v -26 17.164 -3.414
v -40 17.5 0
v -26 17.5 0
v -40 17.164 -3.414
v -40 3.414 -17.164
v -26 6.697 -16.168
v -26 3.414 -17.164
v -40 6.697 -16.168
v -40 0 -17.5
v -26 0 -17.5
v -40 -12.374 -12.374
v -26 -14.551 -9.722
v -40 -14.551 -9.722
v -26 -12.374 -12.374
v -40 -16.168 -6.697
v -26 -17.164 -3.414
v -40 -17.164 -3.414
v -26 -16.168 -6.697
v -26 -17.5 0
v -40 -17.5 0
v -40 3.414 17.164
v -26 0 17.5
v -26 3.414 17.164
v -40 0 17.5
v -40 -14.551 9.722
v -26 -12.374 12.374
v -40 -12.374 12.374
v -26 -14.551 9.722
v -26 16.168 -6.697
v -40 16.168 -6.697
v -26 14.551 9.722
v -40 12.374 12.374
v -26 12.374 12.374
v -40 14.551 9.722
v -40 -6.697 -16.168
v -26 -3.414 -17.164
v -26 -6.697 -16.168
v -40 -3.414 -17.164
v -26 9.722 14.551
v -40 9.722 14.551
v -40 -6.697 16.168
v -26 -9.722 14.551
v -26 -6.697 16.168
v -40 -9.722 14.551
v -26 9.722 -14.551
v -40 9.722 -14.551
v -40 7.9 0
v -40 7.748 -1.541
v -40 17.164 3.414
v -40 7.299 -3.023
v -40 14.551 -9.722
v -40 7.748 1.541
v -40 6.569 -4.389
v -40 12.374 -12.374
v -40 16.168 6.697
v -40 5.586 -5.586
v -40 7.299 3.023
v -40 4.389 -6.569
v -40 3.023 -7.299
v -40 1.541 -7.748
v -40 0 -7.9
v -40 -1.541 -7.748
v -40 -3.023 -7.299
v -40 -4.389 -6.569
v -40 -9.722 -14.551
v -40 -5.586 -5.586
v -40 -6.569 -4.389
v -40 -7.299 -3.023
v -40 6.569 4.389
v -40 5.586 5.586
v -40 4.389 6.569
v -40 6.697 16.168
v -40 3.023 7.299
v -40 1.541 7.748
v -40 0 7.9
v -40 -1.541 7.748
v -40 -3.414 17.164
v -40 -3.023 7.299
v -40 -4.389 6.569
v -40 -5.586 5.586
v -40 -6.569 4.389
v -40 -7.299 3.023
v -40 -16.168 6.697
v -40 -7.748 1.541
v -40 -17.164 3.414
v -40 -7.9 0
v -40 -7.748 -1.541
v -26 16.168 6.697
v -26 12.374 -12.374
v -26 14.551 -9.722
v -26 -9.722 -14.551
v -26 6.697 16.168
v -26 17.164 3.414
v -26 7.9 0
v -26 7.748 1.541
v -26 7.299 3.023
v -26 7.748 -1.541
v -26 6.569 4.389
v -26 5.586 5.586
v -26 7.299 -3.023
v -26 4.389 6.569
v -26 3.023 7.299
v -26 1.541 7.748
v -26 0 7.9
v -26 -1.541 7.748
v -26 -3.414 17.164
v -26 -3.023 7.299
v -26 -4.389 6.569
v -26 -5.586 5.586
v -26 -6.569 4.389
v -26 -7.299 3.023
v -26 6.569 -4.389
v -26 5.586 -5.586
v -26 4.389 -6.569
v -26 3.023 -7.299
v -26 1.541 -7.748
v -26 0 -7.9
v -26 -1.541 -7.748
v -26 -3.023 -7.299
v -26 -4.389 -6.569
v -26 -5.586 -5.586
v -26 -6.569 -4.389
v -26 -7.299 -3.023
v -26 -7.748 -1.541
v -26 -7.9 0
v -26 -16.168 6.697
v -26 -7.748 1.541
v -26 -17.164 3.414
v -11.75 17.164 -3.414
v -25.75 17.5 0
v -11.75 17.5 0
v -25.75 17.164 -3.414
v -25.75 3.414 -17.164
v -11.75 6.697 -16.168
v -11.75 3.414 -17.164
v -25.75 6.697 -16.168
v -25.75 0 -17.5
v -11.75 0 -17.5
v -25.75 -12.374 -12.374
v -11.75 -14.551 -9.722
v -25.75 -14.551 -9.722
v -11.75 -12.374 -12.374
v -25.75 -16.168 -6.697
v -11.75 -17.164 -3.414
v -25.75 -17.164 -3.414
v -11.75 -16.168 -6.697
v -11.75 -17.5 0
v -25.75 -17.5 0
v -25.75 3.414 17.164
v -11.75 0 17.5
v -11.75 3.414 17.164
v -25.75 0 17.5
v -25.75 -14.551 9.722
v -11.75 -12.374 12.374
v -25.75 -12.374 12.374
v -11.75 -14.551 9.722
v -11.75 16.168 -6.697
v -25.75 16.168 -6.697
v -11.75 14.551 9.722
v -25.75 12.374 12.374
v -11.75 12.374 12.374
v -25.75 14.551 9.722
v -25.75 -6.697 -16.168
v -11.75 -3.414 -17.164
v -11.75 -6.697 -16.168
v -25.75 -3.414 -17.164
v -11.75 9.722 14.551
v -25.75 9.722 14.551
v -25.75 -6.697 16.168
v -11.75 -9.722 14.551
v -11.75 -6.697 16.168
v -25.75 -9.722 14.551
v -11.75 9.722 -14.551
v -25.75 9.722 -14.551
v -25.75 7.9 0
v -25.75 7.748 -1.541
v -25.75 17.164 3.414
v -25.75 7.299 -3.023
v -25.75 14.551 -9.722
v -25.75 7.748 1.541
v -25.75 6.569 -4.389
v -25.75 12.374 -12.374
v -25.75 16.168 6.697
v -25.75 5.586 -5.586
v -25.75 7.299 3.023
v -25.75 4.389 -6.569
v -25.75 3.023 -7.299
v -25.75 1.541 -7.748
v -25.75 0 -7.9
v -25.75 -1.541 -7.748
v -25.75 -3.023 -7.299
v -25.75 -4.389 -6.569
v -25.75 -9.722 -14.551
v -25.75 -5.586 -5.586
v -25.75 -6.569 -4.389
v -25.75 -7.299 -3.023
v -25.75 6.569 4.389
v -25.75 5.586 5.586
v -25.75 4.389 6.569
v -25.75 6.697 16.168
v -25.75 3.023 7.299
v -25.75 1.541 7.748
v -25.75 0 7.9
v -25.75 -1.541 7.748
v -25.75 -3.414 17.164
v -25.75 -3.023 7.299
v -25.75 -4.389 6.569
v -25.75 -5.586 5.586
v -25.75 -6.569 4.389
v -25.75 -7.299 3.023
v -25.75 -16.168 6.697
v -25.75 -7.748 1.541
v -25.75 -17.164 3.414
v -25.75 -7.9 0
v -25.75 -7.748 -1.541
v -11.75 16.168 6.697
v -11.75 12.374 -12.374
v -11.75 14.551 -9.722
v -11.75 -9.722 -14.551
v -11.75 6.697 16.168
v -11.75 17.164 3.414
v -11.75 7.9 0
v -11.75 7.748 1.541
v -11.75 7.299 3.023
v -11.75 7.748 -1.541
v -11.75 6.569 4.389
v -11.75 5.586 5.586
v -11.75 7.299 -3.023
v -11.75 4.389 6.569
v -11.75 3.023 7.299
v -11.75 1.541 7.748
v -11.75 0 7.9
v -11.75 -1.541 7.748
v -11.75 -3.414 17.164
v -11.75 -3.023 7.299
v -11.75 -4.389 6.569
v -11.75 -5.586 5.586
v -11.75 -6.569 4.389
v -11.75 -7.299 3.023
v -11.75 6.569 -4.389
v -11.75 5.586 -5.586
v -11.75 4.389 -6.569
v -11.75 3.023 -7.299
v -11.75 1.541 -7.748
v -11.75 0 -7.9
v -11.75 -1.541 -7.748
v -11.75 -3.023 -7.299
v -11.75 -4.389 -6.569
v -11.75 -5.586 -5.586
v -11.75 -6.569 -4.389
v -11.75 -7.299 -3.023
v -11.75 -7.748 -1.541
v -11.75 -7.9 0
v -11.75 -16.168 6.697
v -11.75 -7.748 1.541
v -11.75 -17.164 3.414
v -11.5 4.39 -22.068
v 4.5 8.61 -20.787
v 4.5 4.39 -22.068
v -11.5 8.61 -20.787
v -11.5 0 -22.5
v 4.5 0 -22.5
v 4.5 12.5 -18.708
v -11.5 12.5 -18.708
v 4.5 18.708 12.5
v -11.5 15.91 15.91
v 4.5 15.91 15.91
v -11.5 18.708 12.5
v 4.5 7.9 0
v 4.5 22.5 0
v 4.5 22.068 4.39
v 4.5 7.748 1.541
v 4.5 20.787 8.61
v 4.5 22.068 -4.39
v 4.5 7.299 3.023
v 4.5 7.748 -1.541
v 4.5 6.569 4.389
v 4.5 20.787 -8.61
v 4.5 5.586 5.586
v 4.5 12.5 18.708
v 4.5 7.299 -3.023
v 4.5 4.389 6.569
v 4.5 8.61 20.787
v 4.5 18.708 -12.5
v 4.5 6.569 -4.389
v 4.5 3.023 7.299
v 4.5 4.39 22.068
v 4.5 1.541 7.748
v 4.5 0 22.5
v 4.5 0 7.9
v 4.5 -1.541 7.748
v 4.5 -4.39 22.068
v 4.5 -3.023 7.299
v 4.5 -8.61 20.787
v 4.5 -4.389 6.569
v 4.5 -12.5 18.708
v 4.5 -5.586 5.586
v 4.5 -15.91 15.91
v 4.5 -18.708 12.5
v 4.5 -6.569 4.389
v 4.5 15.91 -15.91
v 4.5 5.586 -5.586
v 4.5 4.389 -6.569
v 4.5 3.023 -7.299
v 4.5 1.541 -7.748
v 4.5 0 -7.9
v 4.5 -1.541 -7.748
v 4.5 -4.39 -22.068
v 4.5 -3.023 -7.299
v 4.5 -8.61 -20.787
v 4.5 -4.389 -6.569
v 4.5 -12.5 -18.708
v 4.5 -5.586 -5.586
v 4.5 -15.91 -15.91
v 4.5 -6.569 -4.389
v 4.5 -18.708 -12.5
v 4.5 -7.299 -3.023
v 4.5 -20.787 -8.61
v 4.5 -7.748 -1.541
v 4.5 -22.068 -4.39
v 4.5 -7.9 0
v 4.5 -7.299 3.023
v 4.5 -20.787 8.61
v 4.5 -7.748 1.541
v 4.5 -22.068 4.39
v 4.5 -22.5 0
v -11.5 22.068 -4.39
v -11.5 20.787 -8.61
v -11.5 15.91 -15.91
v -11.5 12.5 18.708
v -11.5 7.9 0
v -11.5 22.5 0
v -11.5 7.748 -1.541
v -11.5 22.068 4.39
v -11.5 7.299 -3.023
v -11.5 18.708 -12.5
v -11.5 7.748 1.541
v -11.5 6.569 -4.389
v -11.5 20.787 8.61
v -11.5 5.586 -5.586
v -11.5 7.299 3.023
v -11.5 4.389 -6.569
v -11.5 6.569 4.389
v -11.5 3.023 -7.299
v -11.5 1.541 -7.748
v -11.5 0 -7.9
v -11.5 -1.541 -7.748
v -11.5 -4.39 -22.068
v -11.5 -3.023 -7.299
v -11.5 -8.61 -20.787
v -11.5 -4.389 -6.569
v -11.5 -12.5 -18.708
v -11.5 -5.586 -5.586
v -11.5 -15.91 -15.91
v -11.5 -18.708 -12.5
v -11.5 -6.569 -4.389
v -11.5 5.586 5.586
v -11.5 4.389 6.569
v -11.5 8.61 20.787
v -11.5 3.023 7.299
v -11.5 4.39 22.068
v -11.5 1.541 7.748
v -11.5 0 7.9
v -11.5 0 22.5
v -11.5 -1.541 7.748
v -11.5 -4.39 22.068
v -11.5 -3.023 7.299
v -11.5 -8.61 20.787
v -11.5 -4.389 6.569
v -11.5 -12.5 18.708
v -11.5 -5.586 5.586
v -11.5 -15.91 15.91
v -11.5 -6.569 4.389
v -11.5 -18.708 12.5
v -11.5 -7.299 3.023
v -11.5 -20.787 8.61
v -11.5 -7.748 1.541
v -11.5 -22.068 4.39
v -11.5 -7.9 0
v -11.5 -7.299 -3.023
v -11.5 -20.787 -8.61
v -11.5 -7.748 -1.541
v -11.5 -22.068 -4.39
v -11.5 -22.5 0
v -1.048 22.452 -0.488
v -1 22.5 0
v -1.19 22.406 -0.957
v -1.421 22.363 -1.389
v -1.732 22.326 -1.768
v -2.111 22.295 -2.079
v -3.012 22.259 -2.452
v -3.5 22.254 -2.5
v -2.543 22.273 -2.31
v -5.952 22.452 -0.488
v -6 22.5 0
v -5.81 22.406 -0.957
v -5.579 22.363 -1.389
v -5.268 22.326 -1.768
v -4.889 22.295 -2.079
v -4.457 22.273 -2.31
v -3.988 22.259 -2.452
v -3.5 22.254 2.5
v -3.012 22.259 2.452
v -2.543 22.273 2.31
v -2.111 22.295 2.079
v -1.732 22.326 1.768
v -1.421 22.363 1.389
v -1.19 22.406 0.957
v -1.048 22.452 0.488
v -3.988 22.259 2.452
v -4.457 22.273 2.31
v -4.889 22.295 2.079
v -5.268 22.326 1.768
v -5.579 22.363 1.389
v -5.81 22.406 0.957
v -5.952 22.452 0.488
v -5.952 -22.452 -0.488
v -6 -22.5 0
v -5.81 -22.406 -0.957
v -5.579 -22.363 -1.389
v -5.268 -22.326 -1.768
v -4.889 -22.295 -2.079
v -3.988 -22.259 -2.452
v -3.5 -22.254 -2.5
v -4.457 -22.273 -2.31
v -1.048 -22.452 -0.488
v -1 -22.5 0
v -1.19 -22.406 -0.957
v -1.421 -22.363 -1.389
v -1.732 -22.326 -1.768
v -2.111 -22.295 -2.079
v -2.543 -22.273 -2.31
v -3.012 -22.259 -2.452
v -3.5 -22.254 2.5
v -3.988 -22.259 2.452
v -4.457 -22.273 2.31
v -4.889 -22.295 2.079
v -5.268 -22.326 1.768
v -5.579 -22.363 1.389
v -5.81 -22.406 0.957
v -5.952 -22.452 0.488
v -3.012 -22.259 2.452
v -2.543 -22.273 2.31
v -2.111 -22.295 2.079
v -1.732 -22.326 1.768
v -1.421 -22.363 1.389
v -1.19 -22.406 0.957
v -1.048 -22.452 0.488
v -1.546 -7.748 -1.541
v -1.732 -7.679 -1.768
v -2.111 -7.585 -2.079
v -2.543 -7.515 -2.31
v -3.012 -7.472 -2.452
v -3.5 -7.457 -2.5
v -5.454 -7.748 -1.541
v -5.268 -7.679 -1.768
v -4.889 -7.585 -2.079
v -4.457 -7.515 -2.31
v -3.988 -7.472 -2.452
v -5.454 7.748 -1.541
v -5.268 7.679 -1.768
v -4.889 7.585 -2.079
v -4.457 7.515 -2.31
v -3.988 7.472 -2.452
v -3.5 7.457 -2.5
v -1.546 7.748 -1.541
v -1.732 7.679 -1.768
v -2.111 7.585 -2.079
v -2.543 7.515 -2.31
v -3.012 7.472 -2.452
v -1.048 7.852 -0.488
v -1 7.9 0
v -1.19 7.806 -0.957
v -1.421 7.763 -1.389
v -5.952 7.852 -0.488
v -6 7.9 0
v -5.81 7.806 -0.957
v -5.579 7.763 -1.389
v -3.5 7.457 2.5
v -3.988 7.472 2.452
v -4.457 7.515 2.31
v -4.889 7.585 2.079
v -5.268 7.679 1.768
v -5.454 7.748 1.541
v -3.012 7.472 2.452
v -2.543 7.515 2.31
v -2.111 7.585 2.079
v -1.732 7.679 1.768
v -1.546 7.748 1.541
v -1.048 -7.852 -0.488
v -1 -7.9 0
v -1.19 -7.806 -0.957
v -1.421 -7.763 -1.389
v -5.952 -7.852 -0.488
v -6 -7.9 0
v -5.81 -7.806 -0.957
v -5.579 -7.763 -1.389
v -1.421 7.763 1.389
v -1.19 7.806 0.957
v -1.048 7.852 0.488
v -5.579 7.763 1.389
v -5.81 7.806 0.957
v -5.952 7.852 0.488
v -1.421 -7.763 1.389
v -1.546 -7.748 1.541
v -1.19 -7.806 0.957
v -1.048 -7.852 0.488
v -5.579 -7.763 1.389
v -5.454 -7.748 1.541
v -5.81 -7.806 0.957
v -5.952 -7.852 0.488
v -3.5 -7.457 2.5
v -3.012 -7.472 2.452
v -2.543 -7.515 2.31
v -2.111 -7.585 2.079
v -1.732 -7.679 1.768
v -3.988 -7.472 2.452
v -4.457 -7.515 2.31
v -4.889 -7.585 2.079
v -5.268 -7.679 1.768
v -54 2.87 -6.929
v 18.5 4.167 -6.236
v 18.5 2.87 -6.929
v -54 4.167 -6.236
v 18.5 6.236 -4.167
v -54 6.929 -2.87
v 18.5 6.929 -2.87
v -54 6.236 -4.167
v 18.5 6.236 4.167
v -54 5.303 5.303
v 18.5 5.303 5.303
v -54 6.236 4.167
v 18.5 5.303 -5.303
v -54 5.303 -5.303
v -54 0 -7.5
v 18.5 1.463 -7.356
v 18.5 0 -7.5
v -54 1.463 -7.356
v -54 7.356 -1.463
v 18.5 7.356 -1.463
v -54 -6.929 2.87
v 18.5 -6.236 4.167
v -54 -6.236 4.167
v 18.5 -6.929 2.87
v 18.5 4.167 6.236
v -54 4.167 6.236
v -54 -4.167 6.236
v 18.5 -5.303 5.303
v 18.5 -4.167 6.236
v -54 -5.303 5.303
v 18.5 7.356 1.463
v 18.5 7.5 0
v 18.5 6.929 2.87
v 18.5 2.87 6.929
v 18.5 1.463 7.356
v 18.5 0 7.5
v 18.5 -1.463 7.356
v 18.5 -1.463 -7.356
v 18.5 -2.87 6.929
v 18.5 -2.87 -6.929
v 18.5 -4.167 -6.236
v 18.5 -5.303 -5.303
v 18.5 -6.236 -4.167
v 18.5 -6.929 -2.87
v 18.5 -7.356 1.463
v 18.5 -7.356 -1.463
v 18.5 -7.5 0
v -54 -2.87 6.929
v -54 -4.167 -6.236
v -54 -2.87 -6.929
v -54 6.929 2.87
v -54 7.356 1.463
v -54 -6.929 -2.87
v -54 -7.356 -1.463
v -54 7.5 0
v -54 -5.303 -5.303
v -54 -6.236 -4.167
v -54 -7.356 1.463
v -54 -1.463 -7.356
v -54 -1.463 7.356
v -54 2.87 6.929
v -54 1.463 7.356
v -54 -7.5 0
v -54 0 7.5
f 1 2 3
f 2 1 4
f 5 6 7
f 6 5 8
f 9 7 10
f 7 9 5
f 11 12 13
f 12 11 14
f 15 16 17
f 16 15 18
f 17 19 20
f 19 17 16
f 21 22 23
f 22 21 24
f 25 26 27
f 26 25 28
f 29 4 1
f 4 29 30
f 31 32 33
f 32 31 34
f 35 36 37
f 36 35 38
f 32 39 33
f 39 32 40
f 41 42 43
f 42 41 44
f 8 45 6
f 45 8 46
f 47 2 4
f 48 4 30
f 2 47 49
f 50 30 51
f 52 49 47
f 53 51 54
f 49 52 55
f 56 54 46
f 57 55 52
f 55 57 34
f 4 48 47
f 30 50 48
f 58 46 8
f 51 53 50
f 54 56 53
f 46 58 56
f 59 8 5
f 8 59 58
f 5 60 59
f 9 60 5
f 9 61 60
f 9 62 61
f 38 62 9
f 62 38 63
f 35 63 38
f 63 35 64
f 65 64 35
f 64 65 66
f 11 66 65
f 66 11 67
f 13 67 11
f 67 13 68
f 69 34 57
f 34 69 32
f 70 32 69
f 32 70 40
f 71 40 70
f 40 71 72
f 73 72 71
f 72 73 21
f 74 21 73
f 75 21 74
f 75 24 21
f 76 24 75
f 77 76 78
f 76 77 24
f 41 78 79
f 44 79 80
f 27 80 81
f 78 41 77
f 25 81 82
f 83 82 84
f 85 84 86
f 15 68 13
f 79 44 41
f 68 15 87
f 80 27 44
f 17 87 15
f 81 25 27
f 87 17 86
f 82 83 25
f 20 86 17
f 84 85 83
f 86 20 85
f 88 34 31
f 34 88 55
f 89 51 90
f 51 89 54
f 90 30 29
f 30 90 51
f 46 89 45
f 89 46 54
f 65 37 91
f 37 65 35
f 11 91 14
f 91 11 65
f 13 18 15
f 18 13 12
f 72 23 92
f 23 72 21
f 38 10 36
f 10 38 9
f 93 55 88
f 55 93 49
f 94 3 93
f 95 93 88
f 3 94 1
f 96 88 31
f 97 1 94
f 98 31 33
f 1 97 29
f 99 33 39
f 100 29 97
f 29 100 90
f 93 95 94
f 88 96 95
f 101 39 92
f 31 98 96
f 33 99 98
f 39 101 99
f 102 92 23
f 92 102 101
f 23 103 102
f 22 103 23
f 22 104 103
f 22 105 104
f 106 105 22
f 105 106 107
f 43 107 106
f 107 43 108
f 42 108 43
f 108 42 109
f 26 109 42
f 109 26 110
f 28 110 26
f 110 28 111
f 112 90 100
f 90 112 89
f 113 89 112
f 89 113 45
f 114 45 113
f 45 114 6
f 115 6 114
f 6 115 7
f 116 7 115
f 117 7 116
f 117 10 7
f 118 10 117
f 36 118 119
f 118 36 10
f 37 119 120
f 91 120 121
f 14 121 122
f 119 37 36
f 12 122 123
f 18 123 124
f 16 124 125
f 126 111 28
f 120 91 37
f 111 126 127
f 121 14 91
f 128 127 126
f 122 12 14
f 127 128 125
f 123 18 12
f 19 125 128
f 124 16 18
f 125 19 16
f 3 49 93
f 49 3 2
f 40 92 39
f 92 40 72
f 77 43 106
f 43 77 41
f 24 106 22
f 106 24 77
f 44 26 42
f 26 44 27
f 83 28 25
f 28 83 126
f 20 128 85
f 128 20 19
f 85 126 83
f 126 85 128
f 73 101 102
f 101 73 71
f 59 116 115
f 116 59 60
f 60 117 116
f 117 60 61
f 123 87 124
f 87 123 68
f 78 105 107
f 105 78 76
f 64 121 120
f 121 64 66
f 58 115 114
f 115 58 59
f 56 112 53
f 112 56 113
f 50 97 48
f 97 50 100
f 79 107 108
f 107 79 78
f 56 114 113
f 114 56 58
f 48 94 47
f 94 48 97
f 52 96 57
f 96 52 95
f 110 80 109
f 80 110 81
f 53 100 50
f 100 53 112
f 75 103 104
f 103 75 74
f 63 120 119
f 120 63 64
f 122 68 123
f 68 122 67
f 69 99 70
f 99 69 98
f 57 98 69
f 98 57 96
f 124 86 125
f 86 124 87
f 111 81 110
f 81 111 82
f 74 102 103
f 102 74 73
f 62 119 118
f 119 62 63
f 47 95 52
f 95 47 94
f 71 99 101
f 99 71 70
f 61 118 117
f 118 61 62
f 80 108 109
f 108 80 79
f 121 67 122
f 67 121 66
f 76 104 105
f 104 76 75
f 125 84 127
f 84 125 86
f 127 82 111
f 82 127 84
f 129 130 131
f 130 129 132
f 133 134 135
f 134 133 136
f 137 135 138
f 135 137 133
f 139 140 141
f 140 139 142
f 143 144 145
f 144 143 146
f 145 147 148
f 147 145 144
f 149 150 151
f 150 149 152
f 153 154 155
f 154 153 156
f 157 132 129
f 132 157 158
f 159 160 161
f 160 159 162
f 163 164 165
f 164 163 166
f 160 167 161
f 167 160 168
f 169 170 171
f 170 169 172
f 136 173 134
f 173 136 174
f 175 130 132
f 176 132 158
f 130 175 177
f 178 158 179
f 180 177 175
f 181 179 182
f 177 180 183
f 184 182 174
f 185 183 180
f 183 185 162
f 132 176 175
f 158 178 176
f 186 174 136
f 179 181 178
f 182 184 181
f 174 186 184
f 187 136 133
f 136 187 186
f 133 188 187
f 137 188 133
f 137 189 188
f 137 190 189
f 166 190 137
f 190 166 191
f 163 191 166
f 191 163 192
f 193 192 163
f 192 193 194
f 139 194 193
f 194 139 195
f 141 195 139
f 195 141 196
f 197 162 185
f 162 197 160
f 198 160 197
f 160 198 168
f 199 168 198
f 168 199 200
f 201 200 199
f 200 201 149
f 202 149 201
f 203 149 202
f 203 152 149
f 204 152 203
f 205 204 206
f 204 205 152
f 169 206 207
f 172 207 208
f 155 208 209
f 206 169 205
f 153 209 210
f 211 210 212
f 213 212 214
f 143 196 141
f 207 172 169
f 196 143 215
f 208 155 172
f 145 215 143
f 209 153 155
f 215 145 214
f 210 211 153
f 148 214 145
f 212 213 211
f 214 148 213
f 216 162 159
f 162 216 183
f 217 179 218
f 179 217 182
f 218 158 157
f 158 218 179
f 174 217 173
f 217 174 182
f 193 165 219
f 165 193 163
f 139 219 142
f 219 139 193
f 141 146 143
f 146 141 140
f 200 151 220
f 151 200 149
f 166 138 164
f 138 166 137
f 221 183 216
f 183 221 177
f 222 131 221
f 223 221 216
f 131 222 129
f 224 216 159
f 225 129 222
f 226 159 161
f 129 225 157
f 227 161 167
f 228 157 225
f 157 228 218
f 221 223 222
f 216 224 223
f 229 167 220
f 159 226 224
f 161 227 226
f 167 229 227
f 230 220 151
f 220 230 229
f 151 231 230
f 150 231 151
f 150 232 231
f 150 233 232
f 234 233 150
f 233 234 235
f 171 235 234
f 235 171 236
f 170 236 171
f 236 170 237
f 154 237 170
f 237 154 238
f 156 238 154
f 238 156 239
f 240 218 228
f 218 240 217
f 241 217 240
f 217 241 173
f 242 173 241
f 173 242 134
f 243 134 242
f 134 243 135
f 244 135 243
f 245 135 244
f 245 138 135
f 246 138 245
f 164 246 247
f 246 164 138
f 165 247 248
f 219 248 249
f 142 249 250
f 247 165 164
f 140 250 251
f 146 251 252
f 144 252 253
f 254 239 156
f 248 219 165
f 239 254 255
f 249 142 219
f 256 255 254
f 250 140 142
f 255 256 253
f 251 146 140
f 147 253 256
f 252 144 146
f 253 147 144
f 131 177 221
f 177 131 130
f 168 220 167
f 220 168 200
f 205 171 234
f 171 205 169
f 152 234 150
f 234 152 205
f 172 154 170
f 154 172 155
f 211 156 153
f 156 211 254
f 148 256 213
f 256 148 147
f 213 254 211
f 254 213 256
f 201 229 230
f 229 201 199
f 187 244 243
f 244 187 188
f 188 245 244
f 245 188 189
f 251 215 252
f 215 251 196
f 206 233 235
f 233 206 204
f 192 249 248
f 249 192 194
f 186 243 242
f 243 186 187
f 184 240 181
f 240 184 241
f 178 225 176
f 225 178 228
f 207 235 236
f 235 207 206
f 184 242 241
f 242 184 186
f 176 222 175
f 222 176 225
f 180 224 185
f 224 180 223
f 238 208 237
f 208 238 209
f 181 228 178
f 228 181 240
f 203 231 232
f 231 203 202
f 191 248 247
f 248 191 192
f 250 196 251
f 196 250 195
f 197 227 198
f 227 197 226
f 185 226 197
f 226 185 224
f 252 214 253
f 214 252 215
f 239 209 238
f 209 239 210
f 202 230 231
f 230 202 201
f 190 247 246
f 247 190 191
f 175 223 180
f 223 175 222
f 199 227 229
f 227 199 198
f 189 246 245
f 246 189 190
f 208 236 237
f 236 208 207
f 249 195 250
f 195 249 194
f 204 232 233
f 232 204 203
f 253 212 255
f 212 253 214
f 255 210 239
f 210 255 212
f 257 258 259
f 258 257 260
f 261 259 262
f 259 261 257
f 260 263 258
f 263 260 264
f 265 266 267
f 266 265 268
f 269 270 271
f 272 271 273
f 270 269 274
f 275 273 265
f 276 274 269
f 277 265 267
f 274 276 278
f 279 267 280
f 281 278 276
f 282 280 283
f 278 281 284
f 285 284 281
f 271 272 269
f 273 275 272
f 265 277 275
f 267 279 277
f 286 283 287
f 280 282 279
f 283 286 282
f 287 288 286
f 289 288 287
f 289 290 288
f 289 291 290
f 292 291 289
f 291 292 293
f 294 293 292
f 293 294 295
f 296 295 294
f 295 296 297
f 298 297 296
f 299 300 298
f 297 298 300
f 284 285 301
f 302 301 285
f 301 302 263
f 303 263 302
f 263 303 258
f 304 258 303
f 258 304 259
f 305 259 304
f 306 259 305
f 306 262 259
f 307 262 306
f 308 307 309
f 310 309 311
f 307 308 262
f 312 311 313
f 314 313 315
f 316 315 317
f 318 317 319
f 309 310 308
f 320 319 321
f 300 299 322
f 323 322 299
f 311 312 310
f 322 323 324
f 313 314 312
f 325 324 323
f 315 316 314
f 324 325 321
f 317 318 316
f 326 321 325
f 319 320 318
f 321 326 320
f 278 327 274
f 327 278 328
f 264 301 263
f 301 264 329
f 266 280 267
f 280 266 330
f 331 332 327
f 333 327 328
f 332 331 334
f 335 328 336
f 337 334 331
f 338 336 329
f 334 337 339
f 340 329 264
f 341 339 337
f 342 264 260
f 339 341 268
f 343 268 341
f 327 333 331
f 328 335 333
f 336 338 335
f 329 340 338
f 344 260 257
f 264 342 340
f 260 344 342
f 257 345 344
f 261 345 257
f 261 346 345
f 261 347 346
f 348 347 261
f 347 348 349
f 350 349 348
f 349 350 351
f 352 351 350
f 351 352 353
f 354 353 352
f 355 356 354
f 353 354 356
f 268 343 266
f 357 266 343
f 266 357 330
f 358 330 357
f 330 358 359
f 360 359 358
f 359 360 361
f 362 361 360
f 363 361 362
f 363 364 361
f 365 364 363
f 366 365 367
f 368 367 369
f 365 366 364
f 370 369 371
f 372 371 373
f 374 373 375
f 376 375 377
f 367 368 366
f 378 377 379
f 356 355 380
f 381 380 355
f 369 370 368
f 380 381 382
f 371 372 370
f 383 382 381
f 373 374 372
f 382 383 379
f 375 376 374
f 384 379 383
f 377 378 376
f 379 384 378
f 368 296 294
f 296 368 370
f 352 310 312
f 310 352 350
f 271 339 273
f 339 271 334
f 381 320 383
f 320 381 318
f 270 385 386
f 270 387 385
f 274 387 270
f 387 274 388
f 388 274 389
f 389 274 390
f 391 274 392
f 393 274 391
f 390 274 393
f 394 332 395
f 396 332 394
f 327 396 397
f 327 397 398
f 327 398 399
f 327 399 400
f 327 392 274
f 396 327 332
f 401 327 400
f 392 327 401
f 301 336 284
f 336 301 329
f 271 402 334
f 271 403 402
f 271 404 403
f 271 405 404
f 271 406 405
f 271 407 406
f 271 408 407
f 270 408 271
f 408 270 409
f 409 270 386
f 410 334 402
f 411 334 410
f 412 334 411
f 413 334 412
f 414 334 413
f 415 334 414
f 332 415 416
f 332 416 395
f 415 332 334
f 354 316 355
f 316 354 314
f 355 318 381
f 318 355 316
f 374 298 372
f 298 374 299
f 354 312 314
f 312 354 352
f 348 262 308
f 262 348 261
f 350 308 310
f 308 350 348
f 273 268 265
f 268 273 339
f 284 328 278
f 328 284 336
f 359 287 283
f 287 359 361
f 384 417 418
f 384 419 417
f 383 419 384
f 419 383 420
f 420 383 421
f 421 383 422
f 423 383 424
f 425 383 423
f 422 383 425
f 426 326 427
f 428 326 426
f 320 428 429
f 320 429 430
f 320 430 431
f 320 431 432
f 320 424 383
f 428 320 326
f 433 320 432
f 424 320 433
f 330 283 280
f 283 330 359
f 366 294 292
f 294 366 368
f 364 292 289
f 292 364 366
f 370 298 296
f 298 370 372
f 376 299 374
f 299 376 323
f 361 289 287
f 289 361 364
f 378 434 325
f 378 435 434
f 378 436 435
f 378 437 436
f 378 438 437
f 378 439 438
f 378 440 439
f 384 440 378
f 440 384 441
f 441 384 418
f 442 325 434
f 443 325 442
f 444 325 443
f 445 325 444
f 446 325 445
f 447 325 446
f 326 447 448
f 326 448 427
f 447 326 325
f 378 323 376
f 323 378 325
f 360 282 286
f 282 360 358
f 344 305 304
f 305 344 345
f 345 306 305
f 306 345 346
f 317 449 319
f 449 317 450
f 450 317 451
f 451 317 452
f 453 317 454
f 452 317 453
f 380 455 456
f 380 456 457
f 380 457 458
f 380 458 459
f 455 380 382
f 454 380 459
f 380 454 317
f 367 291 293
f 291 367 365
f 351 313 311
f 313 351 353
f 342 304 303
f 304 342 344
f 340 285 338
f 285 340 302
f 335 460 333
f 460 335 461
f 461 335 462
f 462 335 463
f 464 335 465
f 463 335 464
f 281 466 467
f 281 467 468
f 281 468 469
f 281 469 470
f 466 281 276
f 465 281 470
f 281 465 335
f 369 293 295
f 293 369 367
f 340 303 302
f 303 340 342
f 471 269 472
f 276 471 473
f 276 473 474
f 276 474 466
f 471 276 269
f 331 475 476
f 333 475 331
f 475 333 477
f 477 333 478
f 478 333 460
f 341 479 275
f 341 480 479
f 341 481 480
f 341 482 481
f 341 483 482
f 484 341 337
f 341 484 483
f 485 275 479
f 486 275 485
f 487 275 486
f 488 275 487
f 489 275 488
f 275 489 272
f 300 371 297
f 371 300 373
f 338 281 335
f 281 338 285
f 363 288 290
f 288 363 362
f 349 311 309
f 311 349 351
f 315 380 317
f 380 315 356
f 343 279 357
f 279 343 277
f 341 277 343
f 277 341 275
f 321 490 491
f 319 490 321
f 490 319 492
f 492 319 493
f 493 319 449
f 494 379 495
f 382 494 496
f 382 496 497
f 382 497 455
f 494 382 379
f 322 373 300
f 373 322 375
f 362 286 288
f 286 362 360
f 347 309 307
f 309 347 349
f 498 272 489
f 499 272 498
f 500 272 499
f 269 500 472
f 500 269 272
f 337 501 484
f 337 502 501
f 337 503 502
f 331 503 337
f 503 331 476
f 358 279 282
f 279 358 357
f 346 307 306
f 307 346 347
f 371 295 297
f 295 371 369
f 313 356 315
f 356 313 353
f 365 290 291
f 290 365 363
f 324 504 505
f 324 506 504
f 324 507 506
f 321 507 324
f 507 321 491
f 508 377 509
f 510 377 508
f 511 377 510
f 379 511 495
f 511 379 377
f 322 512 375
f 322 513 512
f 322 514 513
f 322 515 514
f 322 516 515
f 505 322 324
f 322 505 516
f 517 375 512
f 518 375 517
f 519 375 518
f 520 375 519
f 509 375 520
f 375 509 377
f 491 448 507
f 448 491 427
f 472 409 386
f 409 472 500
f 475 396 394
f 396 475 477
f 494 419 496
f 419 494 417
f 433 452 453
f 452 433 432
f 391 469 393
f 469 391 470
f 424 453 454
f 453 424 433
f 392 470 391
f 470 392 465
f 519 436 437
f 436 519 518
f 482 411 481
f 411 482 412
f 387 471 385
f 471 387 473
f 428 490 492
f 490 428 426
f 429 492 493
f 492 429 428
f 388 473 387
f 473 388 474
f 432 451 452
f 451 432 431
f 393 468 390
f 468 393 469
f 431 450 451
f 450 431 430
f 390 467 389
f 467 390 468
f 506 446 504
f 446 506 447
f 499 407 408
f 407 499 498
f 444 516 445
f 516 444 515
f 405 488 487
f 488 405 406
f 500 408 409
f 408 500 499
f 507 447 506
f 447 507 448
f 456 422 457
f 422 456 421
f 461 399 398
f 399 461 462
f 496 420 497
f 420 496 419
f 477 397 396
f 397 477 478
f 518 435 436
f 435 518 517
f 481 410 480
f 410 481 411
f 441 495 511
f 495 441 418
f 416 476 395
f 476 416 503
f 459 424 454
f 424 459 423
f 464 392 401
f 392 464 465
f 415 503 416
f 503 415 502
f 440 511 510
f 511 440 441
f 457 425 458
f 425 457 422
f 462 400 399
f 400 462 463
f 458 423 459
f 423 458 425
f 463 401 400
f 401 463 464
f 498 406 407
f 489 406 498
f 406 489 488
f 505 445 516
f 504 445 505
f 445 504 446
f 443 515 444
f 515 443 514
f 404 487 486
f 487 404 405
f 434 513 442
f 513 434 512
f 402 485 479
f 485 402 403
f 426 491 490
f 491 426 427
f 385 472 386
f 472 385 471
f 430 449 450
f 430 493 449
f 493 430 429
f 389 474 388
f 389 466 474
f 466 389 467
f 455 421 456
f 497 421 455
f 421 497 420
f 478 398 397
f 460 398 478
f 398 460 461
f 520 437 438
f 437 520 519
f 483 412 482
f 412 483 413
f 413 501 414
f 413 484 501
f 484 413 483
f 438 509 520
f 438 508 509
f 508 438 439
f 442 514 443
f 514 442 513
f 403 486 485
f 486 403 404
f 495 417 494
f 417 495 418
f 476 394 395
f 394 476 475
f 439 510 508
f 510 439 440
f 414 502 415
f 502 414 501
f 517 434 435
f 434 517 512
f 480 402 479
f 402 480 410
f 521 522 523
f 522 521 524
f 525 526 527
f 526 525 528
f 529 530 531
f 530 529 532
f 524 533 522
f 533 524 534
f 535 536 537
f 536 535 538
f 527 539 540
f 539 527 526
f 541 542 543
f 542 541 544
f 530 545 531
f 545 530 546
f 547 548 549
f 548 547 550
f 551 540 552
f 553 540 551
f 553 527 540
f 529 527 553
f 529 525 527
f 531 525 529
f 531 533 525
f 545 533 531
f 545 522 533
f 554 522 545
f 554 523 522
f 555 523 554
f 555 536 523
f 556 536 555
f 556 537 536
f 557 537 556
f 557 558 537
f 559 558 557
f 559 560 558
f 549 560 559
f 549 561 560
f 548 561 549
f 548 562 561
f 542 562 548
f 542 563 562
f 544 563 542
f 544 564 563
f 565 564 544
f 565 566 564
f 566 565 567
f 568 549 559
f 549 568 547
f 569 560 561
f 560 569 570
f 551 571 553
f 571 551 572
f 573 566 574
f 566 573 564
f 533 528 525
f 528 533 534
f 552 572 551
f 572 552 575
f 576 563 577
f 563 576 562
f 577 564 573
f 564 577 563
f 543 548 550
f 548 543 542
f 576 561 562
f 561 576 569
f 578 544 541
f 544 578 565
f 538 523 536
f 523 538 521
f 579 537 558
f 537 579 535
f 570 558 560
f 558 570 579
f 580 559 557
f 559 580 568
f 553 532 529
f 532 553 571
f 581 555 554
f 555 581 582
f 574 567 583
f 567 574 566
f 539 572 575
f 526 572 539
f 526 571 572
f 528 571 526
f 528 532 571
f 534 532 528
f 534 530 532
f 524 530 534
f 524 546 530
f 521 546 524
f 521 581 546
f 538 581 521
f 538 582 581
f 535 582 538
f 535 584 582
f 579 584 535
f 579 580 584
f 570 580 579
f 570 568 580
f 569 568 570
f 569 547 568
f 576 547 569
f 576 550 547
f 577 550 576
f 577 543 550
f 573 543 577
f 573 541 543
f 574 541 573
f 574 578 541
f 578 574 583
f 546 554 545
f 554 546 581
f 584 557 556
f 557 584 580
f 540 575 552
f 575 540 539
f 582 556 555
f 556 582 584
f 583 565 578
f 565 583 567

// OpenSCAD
$fn = 32;

// ------------------------------------------------------------------------
// Shaft with rings and collars: d15 shaft, 3 rings
// Every part is its own module, assembly() places them once.
// ------------------------------------------------------------------------

// --- part 1 ---
module shaft() {
  translate([0, 0, -36.25]) cylinder(h = 72.5, d = 15);
}

// --- part 2 ---
module spacer_a() {
  difference() {
      translate([0, 0, 0]) cylinder(h = 14, d = 35);
      translate([0, 0, -1]) cylinder(h = 16, d = 15.8);
    }
}

// --- part 3 ---
module spacer_b() {
  difference() {
      translate([0, 0, 0]) cylinder(h = 14, d = 35);
      translate([0, 0, -1]) cylinder(h = 16, d = 15.8);
    }
}

// --- part 4 ---
module collar_a() {
  difference() {
    cylinder(h = 16, d = 45);
    translate([0, 0, -1]) cylinder(h = 18, d = 15.8);
    translate([0, 0, 8]) rotate([90, 0, 0]) cylinder(h = 47, d = 5, center = true);
  }
}

// --- assembly ---
module assembly() {
  translate([-17.75, 0, 0]) rotate([0, 90, 0]) shaft();
  translate([-40, 0, 0]) rotate([0, 90, 0]) spacer_a();
  translate([-25.75, 0, 0]) rotate([0, 90, 0]) spacer_b();
  translate([-11.5, 0, 0]) rotate([0, 90, 0]) collar_a();
}

assembly();
